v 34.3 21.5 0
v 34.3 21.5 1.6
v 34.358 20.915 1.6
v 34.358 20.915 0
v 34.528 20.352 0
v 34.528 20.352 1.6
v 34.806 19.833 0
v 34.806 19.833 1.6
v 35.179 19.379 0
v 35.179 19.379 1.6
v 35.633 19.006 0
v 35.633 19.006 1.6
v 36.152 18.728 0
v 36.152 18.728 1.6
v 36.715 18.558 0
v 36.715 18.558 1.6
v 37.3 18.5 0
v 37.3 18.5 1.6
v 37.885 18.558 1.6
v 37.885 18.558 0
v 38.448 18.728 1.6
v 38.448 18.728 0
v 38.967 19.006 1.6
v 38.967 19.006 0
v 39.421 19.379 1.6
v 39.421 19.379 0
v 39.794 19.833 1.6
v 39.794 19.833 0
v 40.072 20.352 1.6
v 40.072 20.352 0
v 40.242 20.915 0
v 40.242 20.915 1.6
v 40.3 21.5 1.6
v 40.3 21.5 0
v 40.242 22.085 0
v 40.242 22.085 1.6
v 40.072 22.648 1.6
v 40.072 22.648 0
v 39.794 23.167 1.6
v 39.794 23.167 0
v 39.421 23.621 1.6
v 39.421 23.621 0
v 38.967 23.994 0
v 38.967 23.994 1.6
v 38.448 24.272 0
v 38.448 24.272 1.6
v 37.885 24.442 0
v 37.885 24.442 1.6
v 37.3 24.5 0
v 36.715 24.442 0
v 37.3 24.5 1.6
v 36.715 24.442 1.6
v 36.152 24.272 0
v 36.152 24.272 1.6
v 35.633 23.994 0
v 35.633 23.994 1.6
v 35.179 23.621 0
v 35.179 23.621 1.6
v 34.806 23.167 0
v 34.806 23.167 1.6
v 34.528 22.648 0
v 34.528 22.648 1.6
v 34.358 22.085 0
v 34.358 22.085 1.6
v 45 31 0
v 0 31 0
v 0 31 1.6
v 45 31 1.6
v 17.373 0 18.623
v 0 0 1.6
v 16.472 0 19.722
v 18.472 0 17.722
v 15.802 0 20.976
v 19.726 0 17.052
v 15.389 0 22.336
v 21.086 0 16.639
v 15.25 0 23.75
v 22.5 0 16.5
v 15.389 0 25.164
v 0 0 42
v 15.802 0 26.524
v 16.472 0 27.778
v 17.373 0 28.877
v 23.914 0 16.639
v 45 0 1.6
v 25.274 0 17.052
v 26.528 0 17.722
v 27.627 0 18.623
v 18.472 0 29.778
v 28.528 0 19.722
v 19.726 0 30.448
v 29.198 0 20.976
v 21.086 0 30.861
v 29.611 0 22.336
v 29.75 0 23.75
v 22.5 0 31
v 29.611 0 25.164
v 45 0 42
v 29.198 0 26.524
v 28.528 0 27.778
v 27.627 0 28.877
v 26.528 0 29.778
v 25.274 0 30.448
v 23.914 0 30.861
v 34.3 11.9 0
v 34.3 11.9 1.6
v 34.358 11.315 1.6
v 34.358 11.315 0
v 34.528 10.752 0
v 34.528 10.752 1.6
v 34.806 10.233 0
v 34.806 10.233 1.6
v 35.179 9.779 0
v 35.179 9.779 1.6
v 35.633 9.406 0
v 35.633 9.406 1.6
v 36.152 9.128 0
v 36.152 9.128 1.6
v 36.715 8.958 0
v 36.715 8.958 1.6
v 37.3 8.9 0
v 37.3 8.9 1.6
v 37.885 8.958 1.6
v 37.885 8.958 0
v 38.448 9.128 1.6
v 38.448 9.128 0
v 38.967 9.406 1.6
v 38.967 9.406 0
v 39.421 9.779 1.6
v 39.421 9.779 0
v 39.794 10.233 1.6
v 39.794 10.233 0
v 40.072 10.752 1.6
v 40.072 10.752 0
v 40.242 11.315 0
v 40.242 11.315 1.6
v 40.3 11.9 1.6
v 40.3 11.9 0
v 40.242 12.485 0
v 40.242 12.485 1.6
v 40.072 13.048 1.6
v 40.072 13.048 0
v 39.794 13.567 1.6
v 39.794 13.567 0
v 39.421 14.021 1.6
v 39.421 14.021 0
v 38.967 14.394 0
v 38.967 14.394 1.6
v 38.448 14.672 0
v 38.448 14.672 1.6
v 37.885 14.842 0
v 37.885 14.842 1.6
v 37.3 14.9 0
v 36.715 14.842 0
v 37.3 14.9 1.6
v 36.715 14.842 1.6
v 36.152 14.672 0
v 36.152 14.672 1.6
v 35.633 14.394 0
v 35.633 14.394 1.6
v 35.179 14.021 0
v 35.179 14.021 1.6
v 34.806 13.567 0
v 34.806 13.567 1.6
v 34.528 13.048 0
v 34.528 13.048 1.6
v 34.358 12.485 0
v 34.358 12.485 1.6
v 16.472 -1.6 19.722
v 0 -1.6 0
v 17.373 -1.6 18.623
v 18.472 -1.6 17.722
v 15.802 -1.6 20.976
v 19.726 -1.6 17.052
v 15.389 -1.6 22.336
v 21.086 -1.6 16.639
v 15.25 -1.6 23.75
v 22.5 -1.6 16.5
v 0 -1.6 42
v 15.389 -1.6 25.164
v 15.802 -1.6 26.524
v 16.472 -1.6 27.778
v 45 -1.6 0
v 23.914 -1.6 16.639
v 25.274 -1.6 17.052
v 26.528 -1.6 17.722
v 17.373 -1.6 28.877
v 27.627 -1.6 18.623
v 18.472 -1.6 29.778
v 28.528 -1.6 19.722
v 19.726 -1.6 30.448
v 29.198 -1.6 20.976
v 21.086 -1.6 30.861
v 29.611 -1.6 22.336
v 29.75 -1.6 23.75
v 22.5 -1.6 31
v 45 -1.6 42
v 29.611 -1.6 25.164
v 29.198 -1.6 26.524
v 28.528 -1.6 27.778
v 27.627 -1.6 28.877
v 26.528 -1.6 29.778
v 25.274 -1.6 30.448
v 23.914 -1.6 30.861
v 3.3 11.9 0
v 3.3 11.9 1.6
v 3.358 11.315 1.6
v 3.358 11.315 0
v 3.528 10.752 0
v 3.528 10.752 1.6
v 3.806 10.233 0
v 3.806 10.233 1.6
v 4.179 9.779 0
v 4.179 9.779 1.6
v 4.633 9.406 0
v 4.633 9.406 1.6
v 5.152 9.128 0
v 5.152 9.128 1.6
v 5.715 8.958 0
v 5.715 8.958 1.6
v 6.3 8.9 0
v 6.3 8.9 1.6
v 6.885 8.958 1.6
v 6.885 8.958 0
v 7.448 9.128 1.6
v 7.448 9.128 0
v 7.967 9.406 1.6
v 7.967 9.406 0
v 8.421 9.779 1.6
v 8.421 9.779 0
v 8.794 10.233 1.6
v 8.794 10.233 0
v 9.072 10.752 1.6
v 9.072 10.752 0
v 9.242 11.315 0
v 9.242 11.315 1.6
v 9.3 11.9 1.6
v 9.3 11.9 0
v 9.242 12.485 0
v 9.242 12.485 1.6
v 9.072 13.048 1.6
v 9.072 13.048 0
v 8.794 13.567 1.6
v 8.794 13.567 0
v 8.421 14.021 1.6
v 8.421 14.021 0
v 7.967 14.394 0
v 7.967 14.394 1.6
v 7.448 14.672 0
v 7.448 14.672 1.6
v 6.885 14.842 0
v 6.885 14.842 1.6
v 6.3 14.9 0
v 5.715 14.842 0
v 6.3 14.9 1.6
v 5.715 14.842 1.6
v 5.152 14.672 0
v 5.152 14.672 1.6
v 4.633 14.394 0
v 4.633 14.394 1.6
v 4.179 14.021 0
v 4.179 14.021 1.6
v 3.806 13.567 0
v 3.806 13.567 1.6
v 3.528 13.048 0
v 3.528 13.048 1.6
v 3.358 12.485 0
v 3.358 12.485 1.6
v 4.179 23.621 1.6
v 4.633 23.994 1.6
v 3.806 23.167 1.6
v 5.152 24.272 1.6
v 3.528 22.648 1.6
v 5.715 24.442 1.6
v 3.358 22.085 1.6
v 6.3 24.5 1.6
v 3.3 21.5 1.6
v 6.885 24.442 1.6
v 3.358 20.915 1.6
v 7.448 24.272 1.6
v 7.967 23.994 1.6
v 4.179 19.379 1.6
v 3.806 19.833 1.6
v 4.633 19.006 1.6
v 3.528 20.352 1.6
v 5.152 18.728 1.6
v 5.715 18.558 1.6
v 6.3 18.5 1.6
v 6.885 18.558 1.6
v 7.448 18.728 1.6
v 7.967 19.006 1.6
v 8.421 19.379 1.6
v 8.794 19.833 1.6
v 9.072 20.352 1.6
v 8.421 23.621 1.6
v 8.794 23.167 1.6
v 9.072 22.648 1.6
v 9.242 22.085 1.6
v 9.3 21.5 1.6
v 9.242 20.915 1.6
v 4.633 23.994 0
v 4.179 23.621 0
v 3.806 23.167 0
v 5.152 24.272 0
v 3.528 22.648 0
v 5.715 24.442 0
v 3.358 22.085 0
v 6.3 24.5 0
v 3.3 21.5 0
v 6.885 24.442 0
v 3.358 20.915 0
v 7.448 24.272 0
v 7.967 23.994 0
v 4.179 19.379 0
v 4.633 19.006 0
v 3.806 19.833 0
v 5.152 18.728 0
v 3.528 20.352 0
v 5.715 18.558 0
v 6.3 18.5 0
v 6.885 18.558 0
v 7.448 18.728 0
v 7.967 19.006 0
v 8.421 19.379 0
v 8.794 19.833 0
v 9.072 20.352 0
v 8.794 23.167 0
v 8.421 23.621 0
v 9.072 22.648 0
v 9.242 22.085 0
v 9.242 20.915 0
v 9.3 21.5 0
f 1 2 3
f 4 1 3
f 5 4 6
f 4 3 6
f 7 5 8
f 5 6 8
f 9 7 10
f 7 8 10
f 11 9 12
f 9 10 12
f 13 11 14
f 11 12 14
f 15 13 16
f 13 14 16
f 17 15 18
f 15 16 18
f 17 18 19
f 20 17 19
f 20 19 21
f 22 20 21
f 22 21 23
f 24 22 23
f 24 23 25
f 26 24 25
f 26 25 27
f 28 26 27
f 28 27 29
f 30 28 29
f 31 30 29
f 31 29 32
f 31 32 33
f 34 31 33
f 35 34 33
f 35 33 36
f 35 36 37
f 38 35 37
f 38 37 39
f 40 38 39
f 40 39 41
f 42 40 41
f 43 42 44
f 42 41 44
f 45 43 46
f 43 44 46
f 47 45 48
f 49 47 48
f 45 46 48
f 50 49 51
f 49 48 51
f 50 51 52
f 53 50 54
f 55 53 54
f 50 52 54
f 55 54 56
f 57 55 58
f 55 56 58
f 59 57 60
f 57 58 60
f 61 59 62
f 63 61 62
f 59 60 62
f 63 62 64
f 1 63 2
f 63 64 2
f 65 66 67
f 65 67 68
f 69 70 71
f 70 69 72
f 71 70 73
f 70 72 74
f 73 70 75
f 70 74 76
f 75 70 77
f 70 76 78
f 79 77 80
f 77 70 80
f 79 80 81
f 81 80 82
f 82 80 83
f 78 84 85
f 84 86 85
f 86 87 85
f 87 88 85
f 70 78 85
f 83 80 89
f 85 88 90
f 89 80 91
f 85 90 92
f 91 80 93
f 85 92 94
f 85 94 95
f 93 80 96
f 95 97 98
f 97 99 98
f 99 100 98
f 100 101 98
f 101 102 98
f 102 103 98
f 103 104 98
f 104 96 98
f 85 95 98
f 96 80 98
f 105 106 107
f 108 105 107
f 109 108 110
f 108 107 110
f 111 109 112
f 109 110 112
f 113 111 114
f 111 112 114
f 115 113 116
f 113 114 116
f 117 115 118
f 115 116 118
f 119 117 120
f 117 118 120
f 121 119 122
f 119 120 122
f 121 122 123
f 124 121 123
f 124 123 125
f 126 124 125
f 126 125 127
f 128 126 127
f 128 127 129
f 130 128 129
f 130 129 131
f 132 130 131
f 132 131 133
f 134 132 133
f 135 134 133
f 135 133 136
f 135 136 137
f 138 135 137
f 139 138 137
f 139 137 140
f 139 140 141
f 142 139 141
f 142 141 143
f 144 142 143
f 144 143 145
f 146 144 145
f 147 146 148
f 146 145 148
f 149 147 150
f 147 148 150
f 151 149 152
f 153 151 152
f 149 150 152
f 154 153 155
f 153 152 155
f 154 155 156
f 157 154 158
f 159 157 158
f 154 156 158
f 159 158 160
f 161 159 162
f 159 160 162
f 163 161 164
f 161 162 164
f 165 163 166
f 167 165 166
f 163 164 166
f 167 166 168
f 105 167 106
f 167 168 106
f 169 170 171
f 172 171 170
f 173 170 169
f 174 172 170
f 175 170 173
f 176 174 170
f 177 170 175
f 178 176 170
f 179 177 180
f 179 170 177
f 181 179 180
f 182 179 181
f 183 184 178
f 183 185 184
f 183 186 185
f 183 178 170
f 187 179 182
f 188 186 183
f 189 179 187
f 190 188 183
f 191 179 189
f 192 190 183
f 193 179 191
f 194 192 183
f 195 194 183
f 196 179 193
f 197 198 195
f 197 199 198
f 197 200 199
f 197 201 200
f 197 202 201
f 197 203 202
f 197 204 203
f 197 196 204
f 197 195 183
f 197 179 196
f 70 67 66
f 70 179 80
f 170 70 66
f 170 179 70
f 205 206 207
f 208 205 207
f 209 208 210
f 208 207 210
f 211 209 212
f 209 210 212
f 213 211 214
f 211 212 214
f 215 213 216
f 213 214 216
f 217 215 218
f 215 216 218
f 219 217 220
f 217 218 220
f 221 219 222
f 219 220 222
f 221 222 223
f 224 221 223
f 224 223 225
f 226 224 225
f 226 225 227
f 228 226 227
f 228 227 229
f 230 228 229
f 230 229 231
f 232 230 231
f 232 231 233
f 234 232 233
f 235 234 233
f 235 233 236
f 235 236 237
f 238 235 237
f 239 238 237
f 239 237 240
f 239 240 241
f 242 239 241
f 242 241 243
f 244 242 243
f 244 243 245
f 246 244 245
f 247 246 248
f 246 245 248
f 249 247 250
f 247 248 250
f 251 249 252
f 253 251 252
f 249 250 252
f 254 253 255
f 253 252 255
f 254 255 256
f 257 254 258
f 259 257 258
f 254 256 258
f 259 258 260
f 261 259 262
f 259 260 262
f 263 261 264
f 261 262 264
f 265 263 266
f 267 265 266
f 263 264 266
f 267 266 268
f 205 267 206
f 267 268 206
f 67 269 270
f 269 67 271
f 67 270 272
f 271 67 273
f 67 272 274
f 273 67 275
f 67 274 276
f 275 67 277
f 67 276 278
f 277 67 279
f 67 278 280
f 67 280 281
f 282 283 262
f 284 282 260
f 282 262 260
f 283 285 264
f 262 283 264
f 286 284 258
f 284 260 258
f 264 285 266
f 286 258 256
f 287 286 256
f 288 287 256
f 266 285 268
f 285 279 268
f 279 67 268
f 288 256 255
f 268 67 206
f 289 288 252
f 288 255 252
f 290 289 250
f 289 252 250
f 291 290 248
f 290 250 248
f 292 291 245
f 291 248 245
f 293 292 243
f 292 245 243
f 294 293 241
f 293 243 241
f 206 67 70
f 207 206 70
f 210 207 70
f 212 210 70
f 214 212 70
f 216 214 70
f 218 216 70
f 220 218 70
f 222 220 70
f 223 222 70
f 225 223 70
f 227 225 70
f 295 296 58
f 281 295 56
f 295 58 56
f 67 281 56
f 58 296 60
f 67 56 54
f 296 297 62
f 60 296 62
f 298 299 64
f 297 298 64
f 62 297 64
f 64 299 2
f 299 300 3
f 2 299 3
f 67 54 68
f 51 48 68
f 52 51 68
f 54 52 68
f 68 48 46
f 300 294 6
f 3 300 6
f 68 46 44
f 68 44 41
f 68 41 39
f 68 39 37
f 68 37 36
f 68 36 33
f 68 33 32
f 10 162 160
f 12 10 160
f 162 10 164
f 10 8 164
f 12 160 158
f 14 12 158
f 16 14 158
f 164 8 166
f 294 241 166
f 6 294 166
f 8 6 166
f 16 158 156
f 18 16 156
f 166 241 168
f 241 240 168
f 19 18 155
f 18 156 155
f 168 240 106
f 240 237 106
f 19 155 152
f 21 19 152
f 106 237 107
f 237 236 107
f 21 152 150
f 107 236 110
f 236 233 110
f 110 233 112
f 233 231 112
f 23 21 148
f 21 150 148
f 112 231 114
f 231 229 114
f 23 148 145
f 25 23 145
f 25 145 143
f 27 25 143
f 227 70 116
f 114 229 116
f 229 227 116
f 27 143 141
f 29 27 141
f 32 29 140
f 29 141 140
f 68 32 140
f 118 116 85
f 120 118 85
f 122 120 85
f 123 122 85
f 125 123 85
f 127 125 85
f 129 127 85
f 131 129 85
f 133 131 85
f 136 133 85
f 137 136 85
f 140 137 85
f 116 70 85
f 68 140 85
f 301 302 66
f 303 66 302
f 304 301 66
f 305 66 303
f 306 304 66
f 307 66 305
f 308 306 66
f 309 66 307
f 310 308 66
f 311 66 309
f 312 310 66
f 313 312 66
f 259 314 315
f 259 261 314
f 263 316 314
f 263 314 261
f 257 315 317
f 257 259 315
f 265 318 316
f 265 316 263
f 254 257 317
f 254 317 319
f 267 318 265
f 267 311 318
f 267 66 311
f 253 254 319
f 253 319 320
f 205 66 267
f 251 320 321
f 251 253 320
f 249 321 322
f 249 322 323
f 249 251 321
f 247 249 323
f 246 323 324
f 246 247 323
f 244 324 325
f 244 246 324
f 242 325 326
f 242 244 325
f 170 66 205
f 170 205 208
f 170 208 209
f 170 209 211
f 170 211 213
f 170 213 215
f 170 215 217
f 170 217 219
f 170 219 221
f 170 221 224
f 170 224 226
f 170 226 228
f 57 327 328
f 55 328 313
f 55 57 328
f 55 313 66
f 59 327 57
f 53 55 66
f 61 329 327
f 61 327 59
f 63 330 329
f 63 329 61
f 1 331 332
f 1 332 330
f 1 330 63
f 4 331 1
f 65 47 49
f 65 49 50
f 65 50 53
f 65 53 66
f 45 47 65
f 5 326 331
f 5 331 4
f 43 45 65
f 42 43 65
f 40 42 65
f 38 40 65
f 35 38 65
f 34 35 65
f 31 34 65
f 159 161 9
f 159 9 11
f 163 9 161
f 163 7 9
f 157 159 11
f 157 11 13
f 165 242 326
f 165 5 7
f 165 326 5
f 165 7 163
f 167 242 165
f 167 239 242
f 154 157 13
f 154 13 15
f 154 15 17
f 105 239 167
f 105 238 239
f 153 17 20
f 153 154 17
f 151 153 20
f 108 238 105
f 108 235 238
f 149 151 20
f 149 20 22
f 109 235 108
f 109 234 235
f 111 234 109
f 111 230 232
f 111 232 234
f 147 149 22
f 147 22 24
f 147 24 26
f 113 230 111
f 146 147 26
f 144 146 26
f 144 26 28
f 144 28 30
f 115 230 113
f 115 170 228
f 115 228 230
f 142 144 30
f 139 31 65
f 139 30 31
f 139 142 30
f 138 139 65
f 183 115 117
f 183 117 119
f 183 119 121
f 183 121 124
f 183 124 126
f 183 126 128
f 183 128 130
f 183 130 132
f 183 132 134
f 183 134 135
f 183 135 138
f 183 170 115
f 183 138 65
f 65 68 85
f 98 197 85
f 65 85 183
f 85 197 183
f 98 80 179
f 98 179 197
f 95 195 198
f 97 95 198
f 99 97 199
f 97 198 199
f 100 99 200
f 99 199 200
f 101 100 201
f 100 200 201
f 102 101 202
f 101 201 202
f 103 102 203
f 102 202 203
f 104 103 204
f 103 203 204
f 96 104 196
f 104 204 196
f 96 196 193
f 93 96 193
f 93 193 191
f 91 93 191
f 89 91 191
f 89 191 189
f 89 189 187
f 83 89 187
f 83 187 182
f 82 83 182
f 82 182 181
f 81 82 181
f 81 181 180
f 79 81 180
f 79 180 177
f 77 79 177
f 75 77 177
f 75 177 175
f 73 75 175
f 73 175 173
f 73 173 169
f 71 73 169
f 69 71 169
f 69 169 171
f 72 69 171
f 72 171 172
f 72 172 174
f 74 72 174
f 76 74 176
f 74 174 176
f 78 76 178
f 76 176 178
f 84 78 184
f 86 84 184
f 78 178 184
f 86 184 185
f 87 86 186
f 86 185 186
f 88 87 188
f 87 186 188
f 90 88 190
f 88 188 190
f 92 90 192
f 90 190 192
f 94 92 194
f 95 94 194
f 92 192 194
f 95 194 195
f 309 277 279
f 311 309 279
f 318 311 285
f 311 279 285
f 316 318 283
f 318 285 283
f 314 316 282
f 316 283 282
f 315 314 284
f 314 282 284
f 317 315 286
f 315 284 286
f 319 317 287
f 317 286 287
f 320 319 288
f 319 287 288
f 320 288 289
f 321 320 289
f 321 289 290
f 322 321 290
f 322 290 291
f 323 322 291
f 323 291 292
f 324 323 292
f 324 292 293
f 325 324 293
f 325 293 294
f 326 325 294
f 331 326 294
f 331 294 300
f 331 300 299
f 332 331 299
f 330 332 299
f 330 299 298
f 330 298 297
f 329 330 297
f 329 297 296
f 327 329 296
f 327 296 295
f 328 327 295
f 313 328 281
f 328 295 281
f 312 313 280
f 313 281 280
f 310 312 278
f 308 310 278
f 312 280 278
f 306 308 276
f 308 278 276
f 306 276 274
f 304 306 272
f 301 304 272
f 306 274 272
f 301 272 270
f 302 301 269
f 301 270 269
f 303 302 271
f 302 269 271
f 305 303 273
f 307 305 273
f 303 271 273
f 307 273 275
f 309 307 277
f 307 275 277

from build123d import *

# Parameters (mm, degrees)
SKETCH_W                        = 45
SKETCH_H                        = 42
PAD_DEPTH                       = 1.6
SKETCH001_W                     = 45
SKETCH001_H                     = 1.6
PAD001_DEPTH                    = 31
SKETCH002_R                     = 7.25
POCKET_DEPTH                    = 32.601
SKETCH003_R                     = 3
POCKET001_DEPTH                 = 140.910153
SKETCH003_LINEARPATTERN_2_R     = 3
POCKET001_LINEARPATTERN_2_DEPTH = 140.910153
LINEARPATTERN001_COUNT          = 2
LINEARPATTERN001_PITCH          = 31


with BuildPart() as part:
    # Sketch → Pad (new body)
    with BuildSketch(Plane.XZ):
        with Locations((22.5, 21)):
            Rectangle(SKETCH_W, SKETCH_H)
    extrude(amount=PAD_DEPTH)

    # Sketch001 (on Face5 of Pad) → Pad001 (join)
    with BuildSketch(Plane(origin=(0, 0, 0), x_dir=(1, 0, 0), z_dir=(0, 1, 0))):
        with Locations((22.5, -0.8)):
            Rectangle(SKETCH001_W, SKETCH001_H)
    extrude(amount=PAD001_DEPTH)

    # Sketch002 (on Face5 of Pad001) → Pocket (cut, through all)
    with BuildSketch(Plane.XZ.offset(1.6)):
        with Locations((22.5, 23.75)):
            Circle(SKETCH002_R)
    extrude(amount=-POCKET_DEPTH, mode=Mode.SUBTRACT)

    # Sketch003 (on Face12 of Pocket) → Pocket001 (cut, through all)
    with BuildSketch(Plane(origin=(0, 0, 1.6), x_dir=(-1, 0, 0), z_dir=(0, 0, 1))):
        with Locations((-6.3, -11.9)):
            Circle(SKETCH003_R)
    pocket001 = extrude(amount=-POCKET001_DEPTH, mode=Mode.SUBTRACT)

    # Sketch003 LinearPattern 2 → Pocket001 LinearPattern 2 (cut, through all)
    with BuildSketch(Plane(origin=(0, 9.6, 1.6), x_dir=(-1, 0, 0), z_dir=(0, 0, 1))):
        with Locations((-6.3, -11.9)):
            Circle(SKETCH003_LINEARPATTERN_2_R)
    pocket001_linearpattern_2 = extrude(amount=-POCKET001_LINEARPATTERN_2_DEPTH, mode=Mode.SUBTRACT)

    # LinearPattern001: Pocket001, Pocket001 LinearPattern 2 ×2
    with Locations(*[(i * LINEARPATTERN001_PITCH, 0, 0) for i in range(1, LINEARPATTERN001_COUNT)]):
        add(pocket001, mode=Mode.SUBTRACT)
        add(pocket001_linearpattern_2, mode=Mode.SUBTRACT)


solid = part.part
